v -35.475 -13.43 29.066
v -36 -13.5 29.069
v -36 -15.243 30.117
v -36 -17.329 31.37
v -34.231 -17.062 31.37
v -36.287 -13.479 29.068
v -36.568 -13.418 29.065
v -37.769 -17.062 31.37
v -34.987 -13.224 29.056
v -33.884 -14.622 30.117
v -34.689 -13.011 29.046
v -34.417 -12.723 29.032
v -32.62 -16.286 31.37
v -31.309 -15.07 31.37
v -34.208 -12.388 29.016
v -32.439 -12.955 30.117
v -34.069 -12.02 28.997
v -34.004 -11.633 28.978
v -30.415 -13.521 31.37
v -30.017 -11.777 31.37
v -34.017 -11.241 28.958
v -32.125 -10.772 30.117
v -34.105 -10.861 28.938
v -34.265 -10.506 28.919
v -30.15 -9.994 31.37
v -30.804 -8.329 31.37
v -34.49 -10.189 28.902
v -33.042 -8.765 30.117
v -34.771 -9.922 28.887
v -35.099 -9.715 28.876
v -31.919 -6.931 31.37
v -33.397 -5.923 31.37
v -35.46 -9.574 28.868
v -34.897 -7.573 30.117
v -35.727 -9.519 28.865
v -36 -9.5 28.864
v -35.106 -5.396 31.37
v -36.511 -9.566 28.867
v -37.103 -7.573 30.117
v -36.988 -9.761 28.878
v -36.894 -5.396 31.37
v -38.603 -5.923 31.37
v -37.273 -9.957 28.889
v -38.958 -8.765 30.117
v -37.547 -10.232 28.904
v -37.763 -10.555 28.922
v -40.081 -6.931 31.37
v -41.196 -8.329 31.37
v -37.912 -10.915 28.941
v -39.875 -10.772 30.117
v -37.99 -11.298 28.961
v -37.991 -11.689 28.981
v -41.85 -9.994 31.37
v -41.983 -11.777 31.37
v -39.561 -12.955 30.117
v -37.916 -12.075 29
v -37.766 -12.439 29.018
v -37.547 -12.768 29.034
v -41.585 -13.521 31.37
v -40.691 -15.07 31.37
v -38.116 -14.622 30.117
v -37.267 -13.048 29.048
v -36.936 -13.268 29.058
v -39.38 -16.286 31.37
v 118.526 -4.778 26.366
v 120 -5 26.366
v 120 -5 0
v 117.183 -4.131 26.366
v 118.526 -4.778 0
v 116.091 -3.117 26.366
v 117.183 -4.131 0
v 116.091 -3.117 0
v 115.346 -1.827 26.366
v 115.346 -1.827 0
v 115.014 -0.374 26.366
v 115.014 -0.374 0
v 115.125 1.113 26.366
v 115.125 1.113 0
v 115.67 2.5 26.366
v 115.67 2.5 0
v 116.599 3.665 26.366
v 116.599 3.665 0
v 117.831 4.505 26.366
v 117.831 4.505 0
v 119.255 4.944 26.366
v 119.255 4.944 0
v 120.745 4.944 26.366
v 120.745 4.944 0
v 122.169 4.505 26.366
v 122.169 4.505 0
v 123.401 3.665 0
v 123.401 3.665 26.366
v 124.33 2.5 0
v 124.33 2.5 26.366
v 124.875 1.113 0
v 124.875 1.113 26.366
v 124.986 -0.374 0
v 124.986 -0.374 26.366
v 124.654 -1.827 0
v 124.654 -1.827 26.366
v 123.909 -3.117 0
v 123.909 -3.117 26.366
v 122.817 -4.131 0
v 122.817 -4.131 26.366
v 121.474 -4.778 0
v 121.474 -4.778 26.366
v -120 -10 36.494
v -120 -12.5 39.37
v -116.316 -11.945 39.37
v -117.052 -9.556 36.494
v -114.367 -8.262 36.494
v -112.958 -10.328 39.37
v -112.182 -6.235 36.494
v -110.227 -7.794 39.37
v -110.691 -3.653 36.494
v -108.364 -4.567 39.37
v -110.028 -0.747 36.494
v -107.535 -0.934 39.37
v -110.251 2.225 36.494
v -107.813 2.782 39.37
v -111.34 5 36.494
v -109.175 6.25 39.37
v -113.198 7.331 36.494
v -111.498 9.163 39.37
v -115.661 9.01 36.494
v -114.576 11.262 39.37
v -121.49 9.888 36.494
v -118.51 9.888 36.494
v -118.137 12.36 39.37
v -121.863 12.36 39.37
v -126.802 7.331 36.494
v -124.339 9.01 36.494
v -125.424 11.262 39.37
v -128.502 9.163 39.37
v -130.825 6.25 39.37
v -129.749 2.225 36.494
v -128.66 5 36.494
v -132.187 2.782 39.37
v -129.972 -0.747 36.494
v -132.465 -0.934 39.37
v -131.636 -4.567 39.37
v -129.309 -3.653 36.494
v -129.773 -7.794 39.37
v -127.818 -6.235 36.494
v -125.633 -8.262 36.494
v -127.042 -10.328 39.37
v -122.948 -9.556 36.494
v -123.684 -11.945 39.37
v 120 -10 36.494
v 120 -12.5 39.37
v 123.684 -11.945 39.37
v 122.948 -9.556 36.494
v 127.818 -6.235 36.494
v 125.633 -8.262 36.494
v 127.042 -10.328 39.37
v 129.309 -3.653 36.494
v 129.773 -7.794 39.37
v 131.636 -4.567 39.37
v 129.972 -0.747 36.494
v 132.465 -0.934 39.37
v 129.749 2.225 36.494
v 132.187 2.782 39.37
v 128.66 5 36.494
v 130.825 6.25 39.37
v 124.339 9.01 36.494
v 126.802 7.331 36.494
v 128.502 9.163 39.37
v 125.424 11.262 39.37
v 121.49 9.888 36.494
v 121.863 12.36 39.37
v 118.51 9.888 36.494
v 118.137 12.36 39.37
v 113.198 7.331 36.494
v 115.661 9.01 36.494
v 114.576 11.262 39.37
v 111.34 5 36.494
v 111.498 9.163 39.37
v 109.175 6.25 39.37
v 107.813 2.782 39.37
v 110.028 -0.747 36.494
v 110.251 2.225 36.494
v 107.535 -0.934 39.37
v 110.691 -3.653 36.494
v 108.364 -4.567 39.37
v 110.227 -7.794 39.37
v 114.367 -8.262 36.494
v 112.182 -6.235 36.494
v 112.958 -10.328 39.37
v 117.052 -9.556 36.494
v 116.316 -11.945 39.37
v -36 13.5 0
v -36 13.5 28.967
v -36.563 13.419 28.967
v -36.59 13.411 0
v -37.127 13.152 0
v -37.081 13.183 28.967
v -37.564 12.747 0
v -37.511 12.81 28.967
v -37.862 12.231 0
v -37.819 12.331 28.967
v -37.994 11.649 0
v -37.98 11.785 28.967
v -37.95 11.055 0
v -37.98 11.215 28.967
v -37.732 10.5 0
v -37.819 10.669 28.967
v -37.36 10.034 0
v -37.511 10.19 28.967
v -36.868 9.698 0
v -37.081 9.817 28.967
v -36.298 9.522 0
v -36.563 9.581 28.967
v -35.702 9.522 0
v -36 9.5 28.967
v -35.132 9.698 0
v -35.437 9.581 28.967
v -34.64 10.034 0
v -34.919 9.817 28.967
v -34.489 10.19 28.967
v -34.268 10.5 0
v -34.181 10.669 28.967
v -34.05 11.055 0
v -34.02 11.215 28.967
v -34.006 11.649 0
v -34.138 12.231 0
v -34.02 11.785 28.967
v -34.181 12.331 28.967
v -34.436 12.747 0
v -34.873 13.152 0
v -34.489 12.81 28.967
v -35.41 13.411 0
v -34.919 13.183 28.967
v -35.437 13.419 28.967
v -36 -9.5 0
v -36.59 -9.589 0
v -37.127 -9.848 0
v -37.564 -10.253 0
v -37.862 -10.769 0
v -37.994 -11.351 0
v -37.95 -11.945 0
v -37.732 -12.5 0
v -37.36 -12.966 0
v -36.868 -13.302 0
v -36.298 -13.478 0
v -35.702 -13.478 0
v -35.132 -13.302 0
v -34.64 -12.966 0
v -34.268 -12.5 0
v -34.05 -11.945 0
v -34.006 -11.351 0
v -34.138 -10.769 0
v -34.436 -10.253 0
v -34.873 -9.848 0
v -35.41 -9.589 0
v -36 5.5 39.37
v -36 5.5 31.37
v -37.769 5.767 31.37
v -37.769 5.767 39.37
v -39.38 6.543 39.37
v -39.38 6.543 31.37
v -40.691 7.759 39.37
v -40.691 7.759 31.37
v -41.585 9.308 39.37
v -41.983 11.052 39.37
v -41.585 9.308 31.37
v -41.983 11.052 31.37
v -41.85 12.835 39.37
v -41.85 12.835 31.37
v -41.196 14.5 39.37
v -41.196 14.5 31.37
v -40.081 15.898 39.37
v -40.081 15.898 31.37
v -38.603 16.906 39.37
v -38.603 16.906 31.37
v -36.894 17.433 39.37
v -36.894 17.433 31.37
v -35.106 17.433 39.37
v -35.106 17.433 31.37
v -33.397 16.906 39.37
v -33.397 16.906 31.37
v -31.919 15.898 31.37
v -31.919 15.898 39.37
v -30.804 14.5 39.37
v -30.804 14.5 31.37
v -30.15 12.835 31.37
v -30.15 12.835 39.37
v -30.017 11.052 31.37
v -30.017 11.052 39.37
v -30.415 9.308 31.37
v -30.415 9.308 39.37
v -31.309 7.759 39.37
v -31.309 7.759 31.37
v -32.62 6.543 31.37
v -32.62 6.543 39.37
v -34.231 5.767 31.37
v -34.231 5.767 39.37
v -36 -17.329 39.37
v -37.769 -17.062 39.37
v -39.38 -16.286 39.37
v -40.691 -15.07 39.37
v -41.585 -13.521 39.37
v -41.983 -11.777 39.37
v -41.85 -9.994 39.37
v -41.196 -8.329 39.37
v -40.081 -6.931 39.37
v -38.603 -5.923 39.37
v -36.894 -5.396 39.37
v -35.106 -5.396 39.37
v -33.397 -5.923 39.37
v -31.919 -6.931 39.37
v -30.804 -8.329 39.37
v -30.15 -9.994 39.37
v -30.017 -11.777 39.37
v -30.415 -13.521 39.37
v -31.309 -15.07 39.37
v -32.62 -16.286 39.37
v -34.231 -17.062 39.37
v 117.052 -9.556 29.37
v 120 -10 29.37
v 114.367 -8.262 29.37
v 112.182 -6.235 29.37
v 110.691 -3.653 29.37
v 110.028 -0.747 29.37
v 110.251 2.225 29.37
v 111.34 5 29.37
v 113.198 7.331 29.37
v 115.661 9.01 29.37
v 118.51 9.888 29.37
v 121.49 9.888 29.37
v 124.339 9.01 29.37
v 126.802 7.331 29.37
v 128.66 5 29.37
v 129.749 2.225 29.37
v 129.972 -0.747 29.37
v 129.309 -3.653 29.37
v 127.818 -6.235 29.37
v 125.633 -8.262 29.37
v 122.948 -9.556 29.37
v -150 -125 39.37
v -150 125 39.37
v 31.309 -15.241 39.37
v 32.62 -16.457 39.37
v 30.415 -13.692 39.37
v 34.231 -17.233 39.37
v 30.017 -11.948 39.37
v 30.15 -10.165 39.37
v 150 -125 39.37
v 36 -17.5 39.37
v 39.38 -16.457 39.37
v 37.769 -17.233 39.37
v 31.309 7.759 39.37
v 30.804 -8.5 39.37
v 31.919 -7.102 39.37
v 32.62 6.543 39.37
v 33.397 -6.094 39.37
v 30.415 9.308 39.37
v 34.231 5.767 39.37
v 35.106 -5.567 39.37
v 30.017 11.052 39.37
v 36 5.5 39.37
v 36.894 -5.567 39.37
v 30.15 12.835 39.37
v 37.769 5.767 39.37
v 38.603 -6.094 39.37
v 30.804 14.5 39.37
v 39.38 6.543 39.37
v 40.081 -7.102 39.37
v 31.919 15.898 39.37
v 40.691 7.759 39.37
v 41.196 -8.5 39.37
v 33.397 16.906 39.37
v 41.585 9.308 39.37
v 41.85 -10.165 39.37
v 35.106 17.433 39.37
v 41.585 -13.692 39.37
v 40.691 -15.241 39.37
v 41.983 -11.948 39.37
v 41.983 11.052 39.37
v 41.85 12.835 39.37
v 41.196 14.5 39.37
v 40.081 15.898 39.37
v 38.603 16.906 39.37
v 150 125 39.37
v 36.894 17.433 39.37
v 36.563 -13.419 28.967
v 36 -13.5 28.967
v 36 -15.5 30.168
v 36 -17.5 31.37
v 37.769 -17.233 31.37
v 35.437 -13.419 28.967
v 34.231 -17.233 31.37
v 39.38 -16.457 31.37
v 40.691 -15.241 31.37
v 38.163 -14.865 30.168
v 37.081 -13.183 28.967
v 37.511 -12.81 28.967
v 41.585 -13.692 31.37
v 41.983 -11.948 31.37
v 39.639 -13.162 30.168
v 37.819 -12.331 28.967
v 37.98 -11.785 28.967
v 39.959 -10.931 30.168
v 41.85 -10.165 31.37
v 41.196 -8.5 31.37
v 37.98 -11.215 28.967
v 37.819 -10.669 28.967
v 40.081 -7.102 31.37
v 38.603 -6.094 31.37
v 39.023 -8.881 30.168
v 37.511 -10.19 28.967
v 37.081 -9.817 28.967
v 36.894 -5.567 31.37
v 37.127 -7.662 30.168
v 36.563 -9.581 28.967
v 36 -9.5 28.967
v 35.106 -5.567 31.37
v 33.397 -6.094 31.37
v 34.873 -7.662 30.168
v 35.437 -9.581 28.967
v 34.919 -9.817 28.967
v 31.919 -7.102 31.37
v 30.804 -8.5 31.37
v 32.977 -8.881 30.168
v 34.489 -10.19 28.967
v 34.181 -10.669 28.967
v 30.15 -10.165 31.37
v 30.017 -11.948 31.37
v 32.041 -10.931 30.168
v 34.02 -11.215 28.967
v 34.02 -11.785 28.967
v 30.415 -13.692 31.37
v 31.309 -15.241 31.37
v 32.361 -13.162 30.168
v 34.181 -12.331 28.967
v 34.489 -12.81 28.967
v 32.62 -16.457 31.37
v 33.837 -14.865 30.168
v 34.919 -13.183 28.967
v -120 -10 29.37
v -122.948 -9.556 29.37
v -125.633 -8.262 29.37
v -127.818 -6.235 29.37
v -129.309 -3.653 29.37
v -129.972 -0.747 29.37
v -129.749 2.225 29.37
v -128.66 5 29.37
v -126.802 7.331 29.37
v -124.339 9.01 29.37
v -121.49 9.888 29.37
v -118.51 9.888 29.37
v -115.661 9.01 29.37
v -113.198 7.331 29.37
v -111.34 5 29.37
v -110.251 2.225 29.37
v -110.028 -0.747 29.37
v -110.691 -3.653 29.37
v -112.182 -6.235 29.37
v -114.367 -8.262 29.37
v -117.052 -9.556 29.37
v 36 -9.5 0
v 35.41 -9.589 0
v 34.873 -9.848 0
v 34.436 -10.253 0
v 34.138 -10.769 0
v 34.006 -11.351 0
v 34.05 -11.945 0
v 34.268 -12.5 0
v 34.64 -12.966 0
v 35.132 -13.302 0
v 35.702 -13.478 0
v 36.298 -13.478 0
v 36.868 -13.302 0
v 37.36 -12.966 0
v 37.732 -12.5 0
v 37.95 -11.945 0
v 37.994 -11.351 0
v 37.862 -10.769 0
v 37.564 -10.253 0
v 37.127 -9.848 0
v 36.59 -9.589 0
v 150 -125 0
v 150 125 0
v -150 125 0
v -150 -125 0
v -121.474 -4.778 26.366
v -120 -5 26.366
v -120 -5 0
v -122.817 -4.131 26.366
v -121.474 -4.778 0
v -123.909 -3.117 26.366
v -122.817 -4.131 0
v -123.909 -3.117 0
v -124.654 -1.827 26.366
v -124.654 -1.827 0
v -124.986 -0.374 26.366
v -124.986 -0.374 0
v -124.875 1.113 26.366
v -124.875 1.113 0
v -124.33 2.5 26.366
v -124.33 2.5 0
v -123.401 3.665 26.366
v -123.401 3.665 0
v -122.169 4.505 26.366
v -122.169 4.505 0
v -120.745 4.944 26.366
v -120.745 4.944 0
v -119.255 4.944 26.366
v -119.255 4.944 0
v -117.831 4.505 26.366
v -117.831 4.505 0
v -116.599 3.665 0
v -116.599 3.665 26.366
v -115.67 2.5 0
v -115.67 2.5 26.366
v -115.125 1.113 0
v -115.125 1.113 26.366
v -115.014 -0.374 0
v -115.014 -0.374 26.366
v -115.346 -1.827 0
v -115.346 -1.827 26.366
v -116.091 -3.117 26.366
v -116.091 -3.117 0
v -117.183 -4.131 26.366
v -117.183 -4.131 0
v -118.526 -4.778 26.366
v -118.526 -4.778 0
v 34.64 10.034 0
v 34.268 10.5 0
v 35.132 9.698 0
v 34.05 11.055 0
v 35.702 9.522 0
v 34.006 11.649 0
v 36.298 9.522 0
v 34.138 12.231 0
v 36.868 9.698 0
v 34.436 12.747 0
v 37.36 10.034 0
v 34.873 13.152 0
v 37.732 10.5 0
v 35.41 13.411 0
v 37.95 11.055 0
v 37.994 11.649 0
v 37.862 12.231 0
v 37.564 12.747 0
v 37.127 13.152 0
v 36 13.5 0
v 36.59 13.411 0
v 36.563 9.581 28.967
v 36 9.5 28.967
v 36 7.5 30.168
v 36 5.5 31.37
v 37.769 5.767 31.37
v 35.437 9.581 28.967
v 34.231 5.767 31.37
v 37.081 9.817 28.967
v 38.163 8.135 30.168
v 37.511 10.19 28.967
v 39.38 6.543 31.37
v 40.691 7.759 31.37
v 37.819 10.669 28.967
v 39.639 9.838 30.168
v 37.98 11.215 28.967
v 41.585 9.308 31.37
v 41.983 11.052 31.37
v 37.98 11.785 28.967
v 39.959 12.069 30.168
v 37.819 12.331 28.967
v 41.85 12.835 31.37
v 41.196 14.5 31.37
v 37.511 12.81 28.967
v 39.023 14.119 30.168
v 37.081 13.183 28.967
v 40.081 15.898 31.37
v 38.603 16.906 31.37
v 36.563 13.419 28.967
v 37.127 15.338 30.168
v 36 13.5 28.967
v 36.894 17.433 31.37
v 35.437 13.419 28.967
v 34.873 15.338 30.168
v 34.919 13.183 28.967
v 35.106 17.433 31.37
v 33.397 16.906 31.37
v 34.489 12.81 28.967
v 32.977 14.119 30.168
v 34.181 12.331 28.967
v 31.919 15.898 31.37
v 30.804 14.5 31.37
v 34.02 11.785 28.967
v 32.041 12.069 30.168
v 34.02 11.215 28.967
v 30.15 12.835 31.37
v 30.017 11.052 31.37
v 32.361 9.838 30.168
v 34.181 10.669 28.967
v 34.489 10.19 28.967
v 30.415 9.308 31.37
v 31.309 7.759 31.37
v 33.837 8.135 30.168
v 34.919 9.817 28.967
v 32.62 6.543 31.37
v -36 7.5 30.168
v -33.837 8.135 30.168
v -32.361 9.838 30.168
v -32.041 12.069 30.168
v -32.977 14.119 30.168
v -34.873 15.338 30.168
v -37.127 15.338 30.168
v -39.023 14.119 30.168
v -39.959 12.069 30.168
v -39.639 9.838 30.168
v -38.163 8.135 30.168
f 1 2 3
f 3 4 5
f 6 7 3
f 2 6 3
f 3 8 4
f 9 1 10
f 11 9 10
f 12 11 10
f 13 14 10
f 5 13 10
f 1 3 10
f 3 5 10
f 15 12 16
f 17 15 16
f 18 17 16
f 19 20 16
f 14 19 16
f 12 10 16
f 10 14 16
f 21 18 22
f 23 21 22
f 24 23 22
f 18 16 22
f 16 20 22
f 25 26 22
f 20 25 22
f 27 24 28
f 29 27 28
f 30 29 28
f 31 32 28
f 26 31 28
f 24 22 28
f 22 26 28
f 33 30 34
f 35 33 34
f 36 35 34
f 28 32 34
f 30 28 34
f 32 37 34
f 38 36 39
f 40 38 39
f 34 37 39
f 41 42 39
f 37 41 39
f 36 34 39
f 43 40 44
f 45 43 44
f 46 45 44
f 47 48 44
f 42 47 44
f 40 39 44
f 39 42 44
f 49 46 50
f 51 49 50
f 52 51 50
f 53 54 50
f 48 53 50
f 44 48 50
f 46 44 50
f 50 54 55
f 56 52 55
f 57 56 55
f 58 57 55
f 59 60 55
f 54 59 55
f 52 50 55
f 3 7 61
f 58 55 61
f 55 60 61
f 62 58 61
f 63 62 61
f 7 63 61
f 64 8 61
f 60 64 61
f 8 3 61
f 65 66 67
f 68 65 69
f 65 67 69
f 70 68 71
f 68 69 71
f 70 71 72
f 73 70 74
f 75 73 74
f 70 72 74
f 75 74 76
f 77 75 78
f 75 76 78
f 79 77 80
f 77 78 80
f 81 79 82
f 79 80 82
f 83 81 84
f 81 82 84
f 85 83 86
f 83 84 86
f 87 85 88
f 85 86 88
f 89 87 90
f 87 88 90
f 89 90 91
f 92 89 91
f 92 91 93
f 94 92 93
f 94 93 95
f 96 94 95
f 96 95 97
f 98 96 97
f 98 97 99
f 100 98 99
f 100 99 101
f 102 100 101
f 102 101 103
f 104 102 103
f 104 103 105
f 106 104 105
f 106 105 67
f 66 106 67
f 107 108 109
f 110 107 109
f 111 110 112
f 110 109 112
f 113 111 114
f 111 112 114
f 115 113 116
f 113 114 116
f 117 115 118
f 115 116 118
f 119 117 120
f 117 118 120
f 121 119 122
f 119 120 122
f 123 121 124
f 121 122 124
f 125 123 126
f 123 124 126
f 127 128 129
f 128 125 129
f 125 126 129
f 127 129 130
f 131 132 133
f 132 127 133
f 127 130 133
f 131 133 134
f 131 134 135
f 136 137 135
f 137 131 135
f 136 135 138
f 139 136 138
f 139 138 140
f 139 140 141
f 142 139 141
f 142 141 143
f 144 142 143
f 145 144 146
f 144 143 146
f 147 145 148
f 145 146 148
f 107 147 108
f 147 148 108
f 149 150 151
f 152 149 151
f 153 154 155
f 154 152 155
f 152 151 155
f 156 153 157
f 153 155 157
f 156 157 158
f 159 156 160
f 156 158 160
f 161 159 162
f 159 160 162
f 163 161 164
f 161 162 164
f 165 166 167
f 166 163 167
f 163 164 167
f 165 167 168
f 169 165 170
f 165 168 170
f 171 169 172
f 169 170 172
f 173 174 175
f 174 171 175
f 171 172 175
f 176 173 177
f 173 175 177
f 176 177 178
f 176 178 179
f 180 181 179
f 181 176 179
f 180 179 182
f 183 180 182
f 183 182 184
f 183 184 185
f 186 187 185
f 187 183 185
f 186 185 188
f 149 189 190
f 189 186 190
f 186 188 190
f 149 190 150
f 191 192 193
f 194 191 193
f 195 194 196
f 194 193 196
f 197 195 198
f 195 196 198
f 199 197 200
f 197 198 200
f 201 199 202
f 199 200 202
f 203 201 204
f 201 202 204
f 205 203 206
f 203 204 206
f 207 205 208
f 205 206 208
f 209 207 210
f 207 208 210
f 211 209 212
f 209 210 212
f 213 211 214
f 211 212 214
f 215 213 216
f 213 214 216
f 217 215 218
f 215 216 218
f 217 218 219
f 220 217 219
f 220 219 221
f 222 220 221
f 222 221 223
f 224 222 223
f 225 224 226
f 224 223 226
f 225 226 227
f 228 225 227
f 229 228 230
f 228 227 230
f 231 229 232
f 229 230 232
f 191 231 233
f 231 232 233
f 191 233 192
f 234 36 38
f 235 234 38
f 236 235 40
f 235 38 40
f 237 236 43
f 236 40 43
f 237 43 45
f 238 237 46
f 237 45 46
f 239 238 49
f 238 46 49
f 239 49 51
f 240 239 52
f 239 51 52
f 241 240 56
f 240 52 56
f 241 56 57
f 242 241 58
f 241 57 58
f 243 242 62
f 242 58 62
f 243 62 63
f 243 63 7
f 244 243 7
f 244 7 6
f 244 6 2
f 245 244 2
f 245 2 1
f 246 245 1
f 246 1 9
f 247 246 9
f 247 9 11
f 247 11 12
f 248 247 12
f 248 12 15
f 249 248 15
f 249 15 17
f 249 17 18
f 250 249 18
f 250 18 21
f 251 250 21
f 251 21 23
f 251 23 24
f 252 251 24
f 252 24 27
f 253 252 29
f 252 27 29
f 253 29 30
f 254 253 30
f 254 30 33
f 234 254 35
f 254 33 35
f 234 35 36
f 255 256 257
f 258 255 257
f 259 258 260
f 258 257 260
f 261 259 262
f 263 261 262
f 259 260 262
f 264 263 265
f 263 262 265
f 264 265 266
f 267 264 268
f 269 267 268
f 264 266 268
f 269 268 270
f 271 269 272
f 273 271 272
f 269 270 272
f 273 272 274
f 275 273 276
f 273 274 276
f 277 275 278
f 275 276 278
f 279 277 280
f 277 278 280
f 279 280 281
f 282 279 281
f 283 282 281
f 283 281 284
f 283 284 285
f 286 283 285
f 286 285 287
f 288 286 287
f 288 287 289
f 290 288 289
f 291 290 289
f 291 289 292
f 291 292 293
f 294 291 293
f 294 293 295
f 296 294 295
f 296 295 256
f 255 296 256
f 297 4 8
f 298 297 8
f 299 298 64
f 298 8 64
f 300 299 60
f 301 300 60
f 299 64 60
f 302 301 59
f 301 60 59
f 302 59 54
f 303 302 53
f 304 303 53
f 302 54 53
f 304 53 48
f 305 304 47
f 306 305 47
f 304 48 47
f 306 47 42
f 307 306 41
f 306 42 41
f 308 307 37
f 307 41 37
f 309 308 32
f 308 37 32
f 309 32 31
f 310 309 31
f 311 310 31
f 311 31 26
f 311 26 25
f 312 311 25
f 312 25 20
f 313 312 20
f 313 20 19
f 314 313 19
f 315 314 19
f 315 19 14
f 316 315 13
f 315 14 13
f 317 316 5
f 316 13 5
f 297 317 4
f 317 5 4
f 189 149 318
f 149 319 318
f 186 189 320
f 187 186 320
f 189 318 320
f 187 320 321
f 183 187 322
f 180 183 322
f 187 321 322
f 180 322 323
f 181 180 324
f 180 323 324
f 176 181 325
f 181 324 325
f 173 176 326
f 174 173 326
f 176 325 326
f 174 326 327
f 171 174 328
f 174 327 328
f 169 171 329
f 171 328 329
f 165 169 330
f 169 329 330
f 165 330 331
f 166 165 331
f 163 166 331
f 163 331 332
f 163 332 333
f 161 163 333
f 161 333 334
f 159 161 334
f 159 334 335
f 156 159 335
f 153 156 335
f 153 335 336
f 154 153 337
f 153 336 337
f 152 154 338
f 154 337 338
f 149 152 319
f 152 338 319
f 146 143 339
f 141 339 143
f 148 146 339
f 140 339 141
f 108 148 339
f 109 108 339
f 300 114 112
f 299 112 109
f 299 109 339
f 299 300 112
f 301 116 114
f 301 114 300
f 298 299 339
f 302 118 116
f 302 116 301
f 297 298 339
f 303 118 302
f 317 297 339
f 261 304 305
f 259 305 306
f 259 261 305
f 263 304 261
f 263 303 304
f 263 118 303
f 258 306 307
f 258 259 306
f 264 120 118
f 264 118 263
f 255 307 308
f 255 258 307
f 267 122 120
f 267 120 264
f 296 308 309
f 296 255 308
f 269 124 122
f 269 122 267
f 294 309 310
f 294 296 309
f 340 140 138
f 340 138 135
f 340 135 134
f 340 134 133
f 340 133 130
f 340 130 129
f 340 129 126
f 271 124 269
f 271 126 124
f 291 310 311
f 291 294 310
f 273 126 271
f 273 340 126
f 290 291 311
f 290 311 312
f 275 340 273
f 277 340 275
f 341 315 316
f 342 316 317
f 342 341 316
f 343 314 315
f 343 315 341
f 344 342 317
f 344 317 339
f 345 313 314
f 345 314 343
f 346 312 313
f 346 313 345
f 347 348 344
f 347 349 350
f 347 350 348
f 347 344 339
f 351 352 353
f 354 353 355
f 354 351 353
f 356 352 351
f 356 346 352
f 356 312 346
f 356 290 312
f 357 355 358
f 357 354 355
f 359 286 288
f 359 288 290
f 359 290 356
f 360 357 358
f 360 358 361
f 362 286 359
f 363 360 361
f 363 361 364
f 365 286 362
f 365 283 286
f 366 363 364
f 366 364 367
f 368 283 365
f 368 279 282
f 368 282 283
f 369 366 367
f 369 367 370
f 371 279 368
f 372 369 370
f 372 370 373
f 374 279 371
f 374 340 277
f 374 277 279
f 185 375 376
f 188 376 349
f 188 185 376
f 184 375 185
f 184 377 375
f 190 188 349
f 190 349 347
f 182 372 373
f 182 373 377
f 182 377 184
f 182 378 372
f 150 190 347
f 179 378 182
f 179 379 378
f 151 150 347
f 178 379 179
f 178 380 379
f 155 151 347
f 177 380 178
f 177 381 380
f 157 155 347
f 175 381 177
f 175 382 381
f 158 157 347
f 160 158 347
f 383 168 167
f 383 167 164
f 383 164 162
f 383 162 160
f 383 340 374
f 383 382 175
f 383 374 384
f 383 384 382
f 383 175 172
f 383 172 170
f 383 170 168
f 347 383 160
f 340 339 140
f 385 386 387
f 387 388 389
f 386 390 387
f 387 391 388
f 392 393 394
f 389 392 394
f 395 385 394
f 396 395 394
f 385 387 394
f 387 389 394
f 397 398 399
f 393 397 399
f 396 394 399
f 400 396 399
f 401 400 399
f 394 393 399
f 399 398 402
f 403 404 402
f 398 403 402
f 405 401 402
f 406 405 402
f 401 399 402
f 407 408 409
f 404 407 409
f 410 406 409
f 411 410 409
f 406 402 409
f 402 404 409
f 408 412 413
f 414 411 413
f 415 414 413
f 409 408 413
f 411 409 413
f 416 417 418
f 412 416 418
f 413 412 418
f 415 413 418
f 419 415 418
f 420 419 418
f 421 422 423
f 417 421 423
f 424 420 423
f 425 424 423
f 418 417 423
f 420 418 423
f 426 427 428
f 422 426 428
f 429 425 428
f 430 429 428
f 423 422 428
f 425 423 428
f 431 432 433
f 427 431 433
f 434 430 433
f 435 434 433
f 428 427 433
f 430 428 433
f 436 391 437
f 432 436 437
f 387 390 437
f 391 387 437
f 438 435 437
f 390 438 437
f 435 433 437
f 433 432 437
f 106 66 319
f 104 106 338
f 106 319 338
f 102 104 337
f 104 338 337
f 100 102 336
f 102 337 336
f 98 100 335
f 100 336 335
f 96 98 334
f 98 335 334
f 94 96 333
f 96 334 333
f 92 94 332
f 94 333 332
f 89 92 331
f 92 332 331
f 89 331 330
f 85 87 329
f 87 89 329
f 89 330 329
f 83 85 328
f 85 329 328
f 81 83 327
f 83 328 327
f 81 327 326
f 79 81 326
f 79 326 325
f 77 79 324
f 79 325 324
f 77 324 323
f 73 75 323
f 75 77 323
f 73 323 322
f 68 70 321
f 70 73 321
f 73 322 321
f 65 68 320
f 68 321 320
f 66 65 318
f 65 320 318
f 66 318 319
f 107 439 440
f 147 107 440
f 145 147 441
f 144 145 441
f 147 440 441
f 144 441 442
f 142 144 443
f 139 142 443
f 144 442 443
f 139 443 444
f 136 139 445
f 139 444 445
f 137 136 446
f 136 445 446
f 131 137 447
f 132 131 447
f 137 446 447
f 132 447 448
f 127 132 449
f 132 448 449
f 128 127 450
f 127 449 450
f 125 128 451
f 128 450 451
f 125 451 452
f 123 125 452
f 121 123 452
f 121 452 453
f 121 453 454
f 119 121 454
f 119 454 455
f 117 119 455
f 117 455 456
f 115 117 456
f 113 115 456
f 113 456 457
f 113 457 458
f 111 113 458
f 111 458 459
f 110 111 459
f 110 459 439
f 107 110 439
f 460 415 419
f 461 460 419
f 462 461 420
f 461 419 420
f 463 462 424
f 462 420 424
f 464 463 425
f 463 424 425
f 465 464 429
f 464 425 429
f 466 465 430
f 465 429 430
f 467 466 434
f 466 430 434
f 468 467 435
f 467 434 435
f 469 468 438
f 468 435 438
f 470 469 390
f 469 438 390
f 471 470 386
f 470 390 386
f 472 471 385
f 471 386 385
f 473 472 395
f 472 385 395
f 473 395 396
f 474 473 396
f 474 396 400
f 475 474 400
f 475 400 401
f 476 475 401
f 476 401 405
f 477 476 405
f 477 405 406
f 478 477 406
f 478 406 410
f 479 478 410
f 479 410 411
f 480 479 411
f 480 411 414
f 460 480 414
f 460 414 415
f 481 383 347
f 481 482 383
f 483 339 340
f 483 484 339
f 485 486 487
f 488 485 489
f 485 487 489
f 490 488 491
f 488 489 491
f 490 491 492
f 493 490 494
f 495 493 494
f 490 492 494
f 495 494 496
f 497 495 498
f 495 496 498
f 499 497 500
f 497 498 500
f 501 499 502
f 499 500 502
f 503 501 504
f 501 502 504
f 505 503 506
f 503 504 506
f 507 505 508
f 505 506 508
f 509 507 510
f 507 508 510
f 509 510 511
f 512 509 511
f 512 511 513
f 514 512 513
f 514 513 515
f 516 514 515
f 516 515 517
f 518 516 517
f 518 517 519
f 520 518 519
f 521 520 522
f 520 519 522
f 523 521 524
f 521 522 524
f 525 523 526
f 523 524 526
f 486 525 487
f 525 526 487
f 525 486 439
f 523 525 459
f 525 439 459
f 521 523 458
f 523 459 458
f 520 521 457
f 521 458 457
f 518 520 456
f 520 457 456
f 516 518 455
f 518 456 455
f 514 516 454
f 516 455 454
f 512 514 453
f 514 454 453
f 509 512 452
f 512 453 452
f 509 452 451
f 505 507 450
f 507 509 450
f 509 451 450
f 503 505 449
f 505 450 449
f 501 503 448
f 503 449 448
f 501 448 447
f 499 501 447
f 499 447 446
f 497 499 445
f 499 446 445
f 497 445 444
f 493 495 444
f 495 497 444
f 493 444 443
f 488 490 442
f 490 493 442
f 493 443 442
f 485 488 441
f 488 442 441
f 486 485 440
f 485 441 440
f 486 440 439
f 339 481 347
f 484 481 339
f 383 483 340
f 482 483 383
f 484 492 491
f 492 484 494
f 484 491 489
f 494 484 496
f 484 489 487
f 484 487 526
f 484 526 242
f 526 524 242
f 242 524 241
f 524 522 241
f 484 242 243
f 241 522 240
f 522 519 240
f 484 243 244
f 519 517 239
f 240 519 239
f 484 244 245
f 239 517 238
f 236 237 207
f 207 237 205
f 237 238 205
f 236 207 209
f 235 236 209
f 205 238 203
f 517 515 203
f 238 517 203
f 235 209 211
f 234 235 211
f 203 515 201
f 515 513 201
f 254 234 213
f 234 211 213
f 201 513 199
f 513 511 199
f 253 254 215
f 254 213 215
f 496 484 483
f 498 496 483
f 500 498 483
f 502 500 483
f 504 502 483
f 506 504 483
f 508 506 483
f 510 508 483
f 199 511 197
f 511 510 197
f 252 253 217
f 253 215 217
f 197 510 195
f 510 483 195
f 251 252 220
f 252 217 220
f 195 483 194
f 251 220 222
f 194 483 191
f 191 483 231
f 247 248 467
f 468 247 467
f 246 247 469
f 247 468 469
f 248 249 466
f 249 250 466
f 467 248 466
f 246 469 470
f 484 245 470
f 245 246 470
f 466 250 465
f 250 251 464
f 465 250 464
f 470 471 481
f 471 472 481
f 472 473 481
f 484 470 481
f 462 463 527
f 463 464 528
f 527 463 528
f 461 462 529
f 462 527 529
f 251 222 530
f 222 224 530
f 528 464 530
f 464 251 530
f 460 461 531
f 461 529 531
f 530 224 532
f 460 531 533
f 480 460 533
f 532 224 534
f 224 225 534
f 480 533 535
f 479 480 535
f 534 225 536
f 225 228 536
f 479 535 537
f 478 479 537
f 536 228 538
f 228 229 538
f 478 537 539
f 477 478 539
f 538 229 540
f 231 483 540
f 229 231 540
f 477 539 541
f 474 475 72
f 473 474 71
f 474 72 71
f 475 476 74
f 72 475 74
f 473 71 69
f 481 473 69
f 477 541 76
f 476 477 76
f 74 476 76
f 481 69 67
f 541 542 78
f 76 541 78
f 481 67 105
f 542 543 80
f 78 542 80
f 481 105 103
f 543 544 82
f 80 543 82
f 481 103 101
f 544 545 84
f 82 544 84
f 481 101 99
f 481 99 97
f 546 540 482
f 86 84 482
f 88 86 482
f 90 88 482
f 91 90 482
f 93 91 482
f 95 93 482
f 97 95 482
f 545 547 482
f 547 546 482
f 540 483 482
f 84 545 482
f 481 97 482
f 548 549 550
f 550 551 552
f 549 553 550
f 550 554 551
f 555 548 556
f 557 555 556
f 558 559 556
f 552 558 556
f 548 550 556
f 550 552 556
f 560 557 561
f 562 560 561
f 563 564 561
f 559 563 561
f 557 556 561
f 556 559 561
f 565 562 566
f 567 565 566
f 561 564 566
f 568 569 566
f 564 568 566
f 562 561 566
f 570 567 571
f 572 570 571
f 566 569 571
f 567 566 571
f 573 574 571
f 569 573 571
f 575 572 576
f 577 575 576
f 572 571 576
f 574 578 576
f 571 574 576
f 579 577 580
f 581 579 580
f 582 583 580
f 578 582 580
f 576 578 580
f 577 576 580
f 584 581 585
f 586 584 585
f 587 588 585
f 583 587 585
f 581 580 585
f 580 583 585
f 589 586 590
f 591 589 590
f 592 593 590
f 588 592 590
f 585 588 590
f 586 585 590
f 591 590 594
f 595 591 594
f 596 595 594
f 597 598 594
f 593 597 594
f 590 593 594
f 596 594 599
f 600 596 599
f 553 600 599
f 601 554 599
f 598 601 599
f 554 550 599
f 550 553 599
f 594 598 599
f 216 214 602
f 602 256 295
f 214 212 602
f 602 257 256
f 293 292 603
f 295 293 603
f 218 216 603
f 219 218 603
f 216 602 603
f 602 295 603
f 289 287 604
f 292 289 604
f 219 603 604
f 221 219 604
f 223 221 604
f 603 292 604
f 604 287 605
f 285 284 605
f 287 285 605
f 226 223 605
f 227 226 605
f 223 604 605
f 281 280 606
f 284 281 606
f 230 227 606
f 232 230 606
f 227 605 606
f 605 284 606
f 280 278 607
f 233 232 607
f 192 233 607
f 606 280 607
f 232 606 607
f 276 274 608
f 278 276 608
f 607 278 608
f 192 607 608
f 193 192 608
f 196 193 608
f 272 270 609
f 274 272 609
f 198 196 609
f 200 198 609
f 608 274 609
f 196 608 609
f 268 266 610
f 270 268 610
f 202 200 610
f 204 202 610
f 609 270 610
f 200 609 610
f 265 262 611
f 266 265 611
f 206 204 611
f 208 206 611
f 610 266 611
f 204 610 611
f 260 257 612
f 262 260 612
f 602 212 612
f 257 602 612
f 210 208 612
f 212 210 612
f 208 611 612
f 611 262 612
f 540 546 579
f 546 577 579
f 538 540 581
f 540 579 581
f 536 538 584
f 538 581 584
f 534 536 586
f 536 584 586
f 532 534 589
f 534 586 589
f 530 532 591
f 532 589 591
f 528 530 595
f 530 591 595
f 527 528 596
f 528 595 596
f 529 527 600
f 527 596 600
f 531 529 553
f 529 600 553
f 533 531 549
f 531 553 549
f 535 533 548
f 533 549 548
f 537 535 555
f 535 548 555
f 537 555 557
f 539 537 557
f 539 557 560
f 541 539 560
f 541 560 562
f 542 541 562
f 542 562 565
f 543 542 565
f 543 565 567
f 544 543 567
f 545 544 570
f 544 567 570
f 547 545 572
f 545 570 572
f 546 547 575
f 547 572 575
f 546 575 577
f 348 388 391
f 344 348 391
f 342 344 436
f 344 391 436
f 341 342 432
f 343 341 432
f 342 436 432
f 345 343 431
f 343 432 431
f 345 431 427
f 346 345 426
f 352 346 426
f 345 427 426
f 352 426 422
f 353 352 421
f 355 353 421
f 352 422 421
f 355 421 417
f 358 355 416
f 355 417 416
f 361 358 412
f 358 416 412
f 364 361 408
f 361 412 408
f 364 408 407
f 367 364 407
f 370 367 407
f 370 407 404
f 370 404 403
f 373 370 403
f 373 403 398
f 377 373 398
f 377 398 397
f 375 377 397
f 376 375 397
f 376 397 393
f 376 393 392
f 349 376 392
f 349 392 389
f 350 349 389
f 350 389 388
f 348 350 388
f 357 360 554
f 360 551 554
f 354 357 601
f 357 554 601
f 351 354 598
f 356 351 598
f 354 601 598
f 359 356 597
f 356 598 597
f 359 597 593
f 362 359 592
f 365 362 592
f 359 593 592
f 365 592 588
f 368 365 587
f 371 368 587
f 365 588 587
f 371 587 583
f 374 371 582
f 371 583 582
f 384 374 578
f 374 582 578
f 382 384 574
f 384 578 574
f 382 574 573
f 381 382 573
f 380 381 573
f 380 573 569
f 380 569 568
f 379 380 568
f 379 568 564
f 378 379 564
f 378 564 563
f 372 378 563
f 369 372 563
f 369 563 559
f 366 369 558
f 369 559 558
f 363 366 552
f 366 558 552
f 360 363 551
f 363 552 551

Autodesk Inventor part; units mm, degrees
ref_plane "YZ Plane" through (0, 0, 0) normal (1, 0, 0) x (0, 1, 0)
ref_plane "XZ Plane" through (0, 0, 0) normal (0, 1, 0) x (-1, 0, 0)
ref_plane "XY Plane" through (0, 0, 0) normal (0, 0, 1) x (1, 0, 0)
sketch "Sketch1" plane through (0, 0, 0) normal (0, 0, 1) x (1, 0, 0)
  line L0 (-150, 125) -> (150, 125)
  line L1 (150, 125) -> (150, -125)
  line L2 (150, -125) -> (-150, -125)
  line L3 (-150, -125) -> (-150, 125)
  point P0 (0, 0)
  point P1 (0, 125)
  point P2 (150, 0)
  dimension "d0" = 300
  dimension "d1" = 250
extrude "Extrusion1" add sketch "Sketch1" along normal blind 39.37
sketch "Sketch2" plane through (0, 0, 39.37) normal (0, 0, 1) x (1, 0, 0)
  line L0 (-150, 125) -> (-150, -125) projected
  line L1 (150, 125) -> (-150, 125) construction
  line L2 (0, 125) -> (0, -125) construction
  line L3 (-150, -125) -> (150, -125) construction
  point P0 (0, 0)
  point P1 (-120, 0)
  point P2 (120, 0)
  dimension "d4" = 30
hole "Hole1" at (-120, 0, 39.37) at (120, 0, 39.37) direction (0, 0, -1) diameter 10 end through all
hole "Hole2" at (-120, 0, 39.37) at (120, 0, 39.37) direction (0, 0, -1) diameter 20 depth 10 tip angle 118 countersink diameter 25 countersink angle 82
sketch "Sketch3" plane through (0, 0, 0) normal (0, 0, -1) x (-1, 0, 0)
  line L0 (58.5, -28.5) -> (-58.5, -28.5) construction
  line L1 (-58.5, -28.5) -> (-58.5, 28.5) construction
  line L2 (-58.5, 28.5) -> (58.5, 28.5) construction
  line L3 (58.5, 28.5) -> (58.5, -28.5) construction
  circle A0 centre (36, -11.5) radius 2
  line L4 (0, -28.5) -> (0, 28.5) construction
  line L5 (-58.5, 0) -> (58.5, 0) construction
  circle A1 centre (36, 11.5) radius 2
  circle A2 centre (-36, -11.5) radius 2
  circle A3 centre (-36, 11.5) radius 2
  point P0 (0, 0)
  dimension "d19" = 117
  dimension "d20" = 57
  dimension "d24" = 17
  dimension "d25" = 22.5
hole "Hole3" at (-36, -11.5, 0) at (-36, 11.5, 0) at (36, -11.5, 0) at (36, 11.5, 0) direction (0, 0, 1) diameter 4 end through all
sketch "Sketch4" plane through (0, 0, 39.37) normal (0, 0, 1) x (1, 0, 0)
  circle A0 centre (-36, 11.5) radius 2 projected
  circle A1 centre (36, 11.5) radius 2 projected
  circle A2 centre (36, -11.5) radius 2 projected
  point P0 (0, 0)
  point P1 (-36, -11.3289)
hole "Hole5" at (-36, 11.5, 39.37) at (-36, -11.3289, 39.37) at (36, 11.5, 39.37) at (36, -11.5, 39.37) direction (0, 0, -1) diameter 12 depth 8 tip angle 118
properties part number "TablaInferior"
